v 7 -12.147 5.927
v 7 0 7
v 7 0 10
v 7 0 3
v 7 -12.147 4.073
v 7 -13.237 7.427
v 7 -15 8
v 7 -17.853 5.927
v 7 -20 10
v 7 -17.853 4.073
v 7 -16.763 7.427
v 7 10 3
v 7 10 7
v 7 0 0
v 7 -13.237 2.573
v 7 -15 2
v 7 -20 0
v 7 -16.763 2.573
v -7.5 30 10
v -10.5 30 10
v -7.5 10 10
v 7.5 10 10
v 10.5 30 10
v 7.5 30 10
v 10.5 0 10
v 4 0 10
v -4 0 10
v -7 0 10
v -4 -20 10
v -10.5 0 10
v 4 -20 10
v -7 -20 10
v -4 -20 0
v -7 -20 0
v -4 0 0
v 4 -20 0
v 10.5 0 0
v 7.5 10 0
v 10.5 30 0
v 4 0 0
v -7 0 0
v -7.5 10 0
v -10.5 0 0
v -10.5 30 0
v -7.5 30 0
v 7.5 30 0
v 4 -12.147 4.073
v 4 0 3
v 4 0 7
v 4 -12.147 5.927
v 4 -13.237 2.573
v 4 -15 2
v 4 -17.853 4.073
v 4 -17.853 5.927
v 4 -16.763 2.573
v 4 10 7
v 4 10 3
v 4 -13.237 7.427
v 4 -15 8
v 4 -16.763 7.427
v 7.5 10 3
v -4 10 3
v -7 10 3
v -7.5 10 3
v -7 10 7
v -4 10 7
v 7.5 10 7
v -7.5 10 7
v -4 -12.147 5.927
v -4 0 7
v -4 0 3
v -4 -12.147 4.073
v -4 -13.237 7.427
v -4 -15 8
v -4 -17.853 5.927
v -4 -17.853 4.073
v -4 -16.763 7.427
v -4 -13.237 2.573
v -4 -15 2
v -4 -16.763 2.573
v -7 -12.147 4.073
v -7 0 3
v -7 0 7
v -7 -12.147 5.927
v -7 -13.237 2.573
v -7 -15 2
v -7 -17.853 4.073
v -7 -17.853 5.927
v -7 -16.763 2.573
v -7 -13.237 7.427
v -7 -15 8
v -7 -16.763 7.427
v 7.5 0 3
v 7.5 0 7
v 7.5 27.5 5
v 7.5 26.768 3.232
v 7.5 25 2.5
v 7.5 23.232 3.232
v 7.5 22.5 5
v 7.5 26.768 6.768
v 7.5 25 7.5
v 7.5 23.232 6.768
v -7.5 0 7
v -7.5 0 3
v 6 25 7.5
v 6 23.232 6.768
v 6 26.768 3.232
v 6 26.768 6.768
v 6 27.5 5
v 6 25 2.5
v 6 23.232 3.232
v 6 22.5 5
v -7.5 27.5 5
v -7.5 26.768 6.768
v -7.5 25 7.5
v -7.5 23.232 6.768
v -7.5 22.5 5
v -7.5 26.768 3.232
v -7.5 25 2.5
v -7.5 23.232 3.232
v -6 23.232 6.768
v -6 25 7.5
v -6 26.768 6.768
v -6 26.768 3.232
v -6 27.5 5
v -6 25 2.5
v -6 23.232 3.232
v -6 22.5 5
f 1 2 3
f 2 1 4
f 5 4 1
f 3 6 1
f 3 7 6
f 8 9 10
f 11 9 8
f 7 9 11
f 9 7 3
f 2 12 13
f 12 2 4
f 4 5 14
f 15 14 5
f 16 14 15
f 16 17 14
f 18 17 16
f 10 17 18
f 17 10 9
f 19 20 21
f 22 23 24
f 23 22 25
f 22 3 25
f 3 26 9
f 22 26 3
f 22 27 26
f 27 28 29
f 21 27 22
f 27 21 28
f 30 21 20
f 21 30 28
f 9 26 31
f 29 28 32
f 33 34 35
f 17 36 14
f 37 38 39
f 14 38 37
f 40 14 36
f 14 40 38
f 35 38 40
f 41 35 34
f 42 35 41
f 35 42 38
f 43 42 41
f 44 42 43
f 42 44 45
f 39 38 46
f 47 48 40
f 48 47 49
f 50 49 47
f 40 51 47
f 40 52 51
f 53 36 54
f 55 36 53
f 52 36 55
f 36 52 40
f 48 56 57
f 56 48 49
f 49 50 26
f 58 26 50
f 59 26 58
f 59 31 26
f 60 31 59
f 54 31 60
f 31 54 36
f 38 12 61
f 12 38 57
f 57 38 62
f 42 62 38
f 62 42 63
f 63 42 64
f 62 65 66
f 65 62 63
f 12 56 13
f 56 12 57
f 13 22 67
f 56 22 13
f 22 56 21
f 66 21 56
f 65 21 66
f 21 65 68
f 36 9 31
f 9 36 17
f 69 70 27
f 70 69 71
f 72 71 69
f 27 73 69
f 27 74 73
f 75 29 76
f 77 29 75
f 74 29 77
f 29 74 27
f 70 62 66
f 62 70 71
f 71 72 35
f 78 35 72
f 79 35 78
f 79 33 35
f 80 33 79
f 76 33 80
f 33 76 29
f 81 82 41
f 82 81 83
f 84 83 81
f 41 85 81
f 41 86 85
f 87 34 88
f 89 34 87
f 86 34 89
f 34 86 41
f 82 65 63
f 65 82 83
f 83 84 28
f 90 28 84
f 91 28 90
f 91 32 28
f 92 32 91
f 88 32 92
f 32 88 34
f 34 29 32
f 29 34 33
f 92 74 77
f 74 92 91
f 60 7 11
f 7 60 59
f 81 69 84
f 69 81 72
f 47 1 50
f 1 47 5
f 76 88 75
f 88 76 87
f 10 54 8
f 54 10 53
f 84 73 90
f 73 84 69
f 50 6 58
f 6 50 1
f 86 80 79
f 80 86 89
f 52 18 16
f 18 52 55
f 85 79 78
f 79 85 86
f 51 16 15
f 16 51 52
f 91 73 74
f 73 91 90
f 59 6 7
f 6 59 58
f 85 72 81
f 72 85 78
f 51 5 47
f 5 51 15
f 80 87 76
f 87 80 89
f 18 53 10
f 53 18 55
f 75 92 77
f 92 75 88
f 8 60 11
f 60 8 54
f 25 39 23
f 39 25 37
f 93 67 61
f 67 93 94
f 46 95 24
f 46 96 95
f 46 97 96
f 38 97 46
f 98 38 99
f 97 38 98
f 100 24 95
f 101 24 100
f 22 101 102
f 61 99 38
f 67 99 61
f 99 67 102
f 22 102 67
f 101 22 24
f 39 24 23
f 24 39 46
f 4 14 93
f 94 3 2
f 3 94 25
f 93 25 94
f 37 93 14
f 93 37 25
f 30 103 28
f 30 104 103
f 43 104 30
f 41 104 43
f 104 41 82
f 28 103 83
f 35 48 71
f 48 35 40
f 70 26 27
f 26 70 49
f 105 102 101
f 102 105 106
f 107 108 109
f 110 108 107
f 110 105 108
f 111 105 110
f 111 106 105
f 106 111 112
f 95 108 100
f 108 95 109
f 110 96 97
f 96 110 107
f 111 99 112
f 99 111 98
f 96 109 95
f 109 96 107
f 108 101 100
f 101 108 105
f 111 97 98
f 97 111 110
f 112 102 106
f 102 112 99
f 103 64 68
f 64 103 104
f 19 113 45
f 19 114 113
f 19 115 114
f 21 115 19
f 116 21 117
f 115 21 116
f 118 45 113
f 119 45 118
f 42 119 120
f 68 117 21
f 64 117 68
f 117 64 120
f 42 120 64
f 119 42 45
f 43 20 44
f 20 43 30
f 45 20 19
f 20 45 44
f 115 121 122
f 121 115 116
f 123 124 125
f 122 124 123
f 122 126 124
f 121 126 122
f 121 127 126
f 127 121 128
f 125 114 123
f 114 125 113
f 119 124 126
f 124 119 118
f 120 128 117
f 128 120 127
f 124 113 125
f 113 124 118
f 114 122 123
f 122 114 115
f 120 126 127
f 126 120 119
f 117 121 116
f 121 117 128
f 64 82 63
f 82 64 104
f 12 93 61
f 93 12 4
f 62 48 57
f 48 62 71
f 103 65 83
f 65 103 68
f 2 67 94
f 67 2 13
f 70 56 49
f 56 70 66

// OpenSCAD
union() {
	union() {
		difference() {
			union() {
				translate(v = [4.0000000000, -20, 0]) {
					cube(size = [3, 30, 10]);
				}
				translate(v = [-7.0000000000, -20, 0]) {
					cube(size = [3, 30, 10]);
				}
			}
			translate(v = [0, -15, 5]) {
				rotate(a = 90, v = [0, 1, 0]) {
					cylinder(h = 16, r = 3, center = true);
				}
			}
		}
		translate(v = [-8.0000000000, 0, 0]) {
			cube(size = [16.0000000000, 10, 3]);
		}
		translate(v = [-8.0000000000, 0, 7]) {
			cube(size = [16.0000000000, 10, 3]);
		}
		translate(v = [7.5000000000, 0, 0]) {
			cube(size = [3, 30, 10]);
			translate(v = [0, 25, 5]) {
				rotate(a = 90, v = [0, 1, 0]) {
					cylinder(h = 3, r = 2.5000000000, center = true);
				}
			}
		}
		translate(v = [-10.5000000000, 0, 0]) {
			cube(size = [3, 30, 10]);
			translate(v = [3, 25, 5]) {
				rotate(a = 90, v = [0, 1, 0]) {
					cylinder(h = 3, r = 2.5000000000, center = true);
				}
			}
		}
	}
}
